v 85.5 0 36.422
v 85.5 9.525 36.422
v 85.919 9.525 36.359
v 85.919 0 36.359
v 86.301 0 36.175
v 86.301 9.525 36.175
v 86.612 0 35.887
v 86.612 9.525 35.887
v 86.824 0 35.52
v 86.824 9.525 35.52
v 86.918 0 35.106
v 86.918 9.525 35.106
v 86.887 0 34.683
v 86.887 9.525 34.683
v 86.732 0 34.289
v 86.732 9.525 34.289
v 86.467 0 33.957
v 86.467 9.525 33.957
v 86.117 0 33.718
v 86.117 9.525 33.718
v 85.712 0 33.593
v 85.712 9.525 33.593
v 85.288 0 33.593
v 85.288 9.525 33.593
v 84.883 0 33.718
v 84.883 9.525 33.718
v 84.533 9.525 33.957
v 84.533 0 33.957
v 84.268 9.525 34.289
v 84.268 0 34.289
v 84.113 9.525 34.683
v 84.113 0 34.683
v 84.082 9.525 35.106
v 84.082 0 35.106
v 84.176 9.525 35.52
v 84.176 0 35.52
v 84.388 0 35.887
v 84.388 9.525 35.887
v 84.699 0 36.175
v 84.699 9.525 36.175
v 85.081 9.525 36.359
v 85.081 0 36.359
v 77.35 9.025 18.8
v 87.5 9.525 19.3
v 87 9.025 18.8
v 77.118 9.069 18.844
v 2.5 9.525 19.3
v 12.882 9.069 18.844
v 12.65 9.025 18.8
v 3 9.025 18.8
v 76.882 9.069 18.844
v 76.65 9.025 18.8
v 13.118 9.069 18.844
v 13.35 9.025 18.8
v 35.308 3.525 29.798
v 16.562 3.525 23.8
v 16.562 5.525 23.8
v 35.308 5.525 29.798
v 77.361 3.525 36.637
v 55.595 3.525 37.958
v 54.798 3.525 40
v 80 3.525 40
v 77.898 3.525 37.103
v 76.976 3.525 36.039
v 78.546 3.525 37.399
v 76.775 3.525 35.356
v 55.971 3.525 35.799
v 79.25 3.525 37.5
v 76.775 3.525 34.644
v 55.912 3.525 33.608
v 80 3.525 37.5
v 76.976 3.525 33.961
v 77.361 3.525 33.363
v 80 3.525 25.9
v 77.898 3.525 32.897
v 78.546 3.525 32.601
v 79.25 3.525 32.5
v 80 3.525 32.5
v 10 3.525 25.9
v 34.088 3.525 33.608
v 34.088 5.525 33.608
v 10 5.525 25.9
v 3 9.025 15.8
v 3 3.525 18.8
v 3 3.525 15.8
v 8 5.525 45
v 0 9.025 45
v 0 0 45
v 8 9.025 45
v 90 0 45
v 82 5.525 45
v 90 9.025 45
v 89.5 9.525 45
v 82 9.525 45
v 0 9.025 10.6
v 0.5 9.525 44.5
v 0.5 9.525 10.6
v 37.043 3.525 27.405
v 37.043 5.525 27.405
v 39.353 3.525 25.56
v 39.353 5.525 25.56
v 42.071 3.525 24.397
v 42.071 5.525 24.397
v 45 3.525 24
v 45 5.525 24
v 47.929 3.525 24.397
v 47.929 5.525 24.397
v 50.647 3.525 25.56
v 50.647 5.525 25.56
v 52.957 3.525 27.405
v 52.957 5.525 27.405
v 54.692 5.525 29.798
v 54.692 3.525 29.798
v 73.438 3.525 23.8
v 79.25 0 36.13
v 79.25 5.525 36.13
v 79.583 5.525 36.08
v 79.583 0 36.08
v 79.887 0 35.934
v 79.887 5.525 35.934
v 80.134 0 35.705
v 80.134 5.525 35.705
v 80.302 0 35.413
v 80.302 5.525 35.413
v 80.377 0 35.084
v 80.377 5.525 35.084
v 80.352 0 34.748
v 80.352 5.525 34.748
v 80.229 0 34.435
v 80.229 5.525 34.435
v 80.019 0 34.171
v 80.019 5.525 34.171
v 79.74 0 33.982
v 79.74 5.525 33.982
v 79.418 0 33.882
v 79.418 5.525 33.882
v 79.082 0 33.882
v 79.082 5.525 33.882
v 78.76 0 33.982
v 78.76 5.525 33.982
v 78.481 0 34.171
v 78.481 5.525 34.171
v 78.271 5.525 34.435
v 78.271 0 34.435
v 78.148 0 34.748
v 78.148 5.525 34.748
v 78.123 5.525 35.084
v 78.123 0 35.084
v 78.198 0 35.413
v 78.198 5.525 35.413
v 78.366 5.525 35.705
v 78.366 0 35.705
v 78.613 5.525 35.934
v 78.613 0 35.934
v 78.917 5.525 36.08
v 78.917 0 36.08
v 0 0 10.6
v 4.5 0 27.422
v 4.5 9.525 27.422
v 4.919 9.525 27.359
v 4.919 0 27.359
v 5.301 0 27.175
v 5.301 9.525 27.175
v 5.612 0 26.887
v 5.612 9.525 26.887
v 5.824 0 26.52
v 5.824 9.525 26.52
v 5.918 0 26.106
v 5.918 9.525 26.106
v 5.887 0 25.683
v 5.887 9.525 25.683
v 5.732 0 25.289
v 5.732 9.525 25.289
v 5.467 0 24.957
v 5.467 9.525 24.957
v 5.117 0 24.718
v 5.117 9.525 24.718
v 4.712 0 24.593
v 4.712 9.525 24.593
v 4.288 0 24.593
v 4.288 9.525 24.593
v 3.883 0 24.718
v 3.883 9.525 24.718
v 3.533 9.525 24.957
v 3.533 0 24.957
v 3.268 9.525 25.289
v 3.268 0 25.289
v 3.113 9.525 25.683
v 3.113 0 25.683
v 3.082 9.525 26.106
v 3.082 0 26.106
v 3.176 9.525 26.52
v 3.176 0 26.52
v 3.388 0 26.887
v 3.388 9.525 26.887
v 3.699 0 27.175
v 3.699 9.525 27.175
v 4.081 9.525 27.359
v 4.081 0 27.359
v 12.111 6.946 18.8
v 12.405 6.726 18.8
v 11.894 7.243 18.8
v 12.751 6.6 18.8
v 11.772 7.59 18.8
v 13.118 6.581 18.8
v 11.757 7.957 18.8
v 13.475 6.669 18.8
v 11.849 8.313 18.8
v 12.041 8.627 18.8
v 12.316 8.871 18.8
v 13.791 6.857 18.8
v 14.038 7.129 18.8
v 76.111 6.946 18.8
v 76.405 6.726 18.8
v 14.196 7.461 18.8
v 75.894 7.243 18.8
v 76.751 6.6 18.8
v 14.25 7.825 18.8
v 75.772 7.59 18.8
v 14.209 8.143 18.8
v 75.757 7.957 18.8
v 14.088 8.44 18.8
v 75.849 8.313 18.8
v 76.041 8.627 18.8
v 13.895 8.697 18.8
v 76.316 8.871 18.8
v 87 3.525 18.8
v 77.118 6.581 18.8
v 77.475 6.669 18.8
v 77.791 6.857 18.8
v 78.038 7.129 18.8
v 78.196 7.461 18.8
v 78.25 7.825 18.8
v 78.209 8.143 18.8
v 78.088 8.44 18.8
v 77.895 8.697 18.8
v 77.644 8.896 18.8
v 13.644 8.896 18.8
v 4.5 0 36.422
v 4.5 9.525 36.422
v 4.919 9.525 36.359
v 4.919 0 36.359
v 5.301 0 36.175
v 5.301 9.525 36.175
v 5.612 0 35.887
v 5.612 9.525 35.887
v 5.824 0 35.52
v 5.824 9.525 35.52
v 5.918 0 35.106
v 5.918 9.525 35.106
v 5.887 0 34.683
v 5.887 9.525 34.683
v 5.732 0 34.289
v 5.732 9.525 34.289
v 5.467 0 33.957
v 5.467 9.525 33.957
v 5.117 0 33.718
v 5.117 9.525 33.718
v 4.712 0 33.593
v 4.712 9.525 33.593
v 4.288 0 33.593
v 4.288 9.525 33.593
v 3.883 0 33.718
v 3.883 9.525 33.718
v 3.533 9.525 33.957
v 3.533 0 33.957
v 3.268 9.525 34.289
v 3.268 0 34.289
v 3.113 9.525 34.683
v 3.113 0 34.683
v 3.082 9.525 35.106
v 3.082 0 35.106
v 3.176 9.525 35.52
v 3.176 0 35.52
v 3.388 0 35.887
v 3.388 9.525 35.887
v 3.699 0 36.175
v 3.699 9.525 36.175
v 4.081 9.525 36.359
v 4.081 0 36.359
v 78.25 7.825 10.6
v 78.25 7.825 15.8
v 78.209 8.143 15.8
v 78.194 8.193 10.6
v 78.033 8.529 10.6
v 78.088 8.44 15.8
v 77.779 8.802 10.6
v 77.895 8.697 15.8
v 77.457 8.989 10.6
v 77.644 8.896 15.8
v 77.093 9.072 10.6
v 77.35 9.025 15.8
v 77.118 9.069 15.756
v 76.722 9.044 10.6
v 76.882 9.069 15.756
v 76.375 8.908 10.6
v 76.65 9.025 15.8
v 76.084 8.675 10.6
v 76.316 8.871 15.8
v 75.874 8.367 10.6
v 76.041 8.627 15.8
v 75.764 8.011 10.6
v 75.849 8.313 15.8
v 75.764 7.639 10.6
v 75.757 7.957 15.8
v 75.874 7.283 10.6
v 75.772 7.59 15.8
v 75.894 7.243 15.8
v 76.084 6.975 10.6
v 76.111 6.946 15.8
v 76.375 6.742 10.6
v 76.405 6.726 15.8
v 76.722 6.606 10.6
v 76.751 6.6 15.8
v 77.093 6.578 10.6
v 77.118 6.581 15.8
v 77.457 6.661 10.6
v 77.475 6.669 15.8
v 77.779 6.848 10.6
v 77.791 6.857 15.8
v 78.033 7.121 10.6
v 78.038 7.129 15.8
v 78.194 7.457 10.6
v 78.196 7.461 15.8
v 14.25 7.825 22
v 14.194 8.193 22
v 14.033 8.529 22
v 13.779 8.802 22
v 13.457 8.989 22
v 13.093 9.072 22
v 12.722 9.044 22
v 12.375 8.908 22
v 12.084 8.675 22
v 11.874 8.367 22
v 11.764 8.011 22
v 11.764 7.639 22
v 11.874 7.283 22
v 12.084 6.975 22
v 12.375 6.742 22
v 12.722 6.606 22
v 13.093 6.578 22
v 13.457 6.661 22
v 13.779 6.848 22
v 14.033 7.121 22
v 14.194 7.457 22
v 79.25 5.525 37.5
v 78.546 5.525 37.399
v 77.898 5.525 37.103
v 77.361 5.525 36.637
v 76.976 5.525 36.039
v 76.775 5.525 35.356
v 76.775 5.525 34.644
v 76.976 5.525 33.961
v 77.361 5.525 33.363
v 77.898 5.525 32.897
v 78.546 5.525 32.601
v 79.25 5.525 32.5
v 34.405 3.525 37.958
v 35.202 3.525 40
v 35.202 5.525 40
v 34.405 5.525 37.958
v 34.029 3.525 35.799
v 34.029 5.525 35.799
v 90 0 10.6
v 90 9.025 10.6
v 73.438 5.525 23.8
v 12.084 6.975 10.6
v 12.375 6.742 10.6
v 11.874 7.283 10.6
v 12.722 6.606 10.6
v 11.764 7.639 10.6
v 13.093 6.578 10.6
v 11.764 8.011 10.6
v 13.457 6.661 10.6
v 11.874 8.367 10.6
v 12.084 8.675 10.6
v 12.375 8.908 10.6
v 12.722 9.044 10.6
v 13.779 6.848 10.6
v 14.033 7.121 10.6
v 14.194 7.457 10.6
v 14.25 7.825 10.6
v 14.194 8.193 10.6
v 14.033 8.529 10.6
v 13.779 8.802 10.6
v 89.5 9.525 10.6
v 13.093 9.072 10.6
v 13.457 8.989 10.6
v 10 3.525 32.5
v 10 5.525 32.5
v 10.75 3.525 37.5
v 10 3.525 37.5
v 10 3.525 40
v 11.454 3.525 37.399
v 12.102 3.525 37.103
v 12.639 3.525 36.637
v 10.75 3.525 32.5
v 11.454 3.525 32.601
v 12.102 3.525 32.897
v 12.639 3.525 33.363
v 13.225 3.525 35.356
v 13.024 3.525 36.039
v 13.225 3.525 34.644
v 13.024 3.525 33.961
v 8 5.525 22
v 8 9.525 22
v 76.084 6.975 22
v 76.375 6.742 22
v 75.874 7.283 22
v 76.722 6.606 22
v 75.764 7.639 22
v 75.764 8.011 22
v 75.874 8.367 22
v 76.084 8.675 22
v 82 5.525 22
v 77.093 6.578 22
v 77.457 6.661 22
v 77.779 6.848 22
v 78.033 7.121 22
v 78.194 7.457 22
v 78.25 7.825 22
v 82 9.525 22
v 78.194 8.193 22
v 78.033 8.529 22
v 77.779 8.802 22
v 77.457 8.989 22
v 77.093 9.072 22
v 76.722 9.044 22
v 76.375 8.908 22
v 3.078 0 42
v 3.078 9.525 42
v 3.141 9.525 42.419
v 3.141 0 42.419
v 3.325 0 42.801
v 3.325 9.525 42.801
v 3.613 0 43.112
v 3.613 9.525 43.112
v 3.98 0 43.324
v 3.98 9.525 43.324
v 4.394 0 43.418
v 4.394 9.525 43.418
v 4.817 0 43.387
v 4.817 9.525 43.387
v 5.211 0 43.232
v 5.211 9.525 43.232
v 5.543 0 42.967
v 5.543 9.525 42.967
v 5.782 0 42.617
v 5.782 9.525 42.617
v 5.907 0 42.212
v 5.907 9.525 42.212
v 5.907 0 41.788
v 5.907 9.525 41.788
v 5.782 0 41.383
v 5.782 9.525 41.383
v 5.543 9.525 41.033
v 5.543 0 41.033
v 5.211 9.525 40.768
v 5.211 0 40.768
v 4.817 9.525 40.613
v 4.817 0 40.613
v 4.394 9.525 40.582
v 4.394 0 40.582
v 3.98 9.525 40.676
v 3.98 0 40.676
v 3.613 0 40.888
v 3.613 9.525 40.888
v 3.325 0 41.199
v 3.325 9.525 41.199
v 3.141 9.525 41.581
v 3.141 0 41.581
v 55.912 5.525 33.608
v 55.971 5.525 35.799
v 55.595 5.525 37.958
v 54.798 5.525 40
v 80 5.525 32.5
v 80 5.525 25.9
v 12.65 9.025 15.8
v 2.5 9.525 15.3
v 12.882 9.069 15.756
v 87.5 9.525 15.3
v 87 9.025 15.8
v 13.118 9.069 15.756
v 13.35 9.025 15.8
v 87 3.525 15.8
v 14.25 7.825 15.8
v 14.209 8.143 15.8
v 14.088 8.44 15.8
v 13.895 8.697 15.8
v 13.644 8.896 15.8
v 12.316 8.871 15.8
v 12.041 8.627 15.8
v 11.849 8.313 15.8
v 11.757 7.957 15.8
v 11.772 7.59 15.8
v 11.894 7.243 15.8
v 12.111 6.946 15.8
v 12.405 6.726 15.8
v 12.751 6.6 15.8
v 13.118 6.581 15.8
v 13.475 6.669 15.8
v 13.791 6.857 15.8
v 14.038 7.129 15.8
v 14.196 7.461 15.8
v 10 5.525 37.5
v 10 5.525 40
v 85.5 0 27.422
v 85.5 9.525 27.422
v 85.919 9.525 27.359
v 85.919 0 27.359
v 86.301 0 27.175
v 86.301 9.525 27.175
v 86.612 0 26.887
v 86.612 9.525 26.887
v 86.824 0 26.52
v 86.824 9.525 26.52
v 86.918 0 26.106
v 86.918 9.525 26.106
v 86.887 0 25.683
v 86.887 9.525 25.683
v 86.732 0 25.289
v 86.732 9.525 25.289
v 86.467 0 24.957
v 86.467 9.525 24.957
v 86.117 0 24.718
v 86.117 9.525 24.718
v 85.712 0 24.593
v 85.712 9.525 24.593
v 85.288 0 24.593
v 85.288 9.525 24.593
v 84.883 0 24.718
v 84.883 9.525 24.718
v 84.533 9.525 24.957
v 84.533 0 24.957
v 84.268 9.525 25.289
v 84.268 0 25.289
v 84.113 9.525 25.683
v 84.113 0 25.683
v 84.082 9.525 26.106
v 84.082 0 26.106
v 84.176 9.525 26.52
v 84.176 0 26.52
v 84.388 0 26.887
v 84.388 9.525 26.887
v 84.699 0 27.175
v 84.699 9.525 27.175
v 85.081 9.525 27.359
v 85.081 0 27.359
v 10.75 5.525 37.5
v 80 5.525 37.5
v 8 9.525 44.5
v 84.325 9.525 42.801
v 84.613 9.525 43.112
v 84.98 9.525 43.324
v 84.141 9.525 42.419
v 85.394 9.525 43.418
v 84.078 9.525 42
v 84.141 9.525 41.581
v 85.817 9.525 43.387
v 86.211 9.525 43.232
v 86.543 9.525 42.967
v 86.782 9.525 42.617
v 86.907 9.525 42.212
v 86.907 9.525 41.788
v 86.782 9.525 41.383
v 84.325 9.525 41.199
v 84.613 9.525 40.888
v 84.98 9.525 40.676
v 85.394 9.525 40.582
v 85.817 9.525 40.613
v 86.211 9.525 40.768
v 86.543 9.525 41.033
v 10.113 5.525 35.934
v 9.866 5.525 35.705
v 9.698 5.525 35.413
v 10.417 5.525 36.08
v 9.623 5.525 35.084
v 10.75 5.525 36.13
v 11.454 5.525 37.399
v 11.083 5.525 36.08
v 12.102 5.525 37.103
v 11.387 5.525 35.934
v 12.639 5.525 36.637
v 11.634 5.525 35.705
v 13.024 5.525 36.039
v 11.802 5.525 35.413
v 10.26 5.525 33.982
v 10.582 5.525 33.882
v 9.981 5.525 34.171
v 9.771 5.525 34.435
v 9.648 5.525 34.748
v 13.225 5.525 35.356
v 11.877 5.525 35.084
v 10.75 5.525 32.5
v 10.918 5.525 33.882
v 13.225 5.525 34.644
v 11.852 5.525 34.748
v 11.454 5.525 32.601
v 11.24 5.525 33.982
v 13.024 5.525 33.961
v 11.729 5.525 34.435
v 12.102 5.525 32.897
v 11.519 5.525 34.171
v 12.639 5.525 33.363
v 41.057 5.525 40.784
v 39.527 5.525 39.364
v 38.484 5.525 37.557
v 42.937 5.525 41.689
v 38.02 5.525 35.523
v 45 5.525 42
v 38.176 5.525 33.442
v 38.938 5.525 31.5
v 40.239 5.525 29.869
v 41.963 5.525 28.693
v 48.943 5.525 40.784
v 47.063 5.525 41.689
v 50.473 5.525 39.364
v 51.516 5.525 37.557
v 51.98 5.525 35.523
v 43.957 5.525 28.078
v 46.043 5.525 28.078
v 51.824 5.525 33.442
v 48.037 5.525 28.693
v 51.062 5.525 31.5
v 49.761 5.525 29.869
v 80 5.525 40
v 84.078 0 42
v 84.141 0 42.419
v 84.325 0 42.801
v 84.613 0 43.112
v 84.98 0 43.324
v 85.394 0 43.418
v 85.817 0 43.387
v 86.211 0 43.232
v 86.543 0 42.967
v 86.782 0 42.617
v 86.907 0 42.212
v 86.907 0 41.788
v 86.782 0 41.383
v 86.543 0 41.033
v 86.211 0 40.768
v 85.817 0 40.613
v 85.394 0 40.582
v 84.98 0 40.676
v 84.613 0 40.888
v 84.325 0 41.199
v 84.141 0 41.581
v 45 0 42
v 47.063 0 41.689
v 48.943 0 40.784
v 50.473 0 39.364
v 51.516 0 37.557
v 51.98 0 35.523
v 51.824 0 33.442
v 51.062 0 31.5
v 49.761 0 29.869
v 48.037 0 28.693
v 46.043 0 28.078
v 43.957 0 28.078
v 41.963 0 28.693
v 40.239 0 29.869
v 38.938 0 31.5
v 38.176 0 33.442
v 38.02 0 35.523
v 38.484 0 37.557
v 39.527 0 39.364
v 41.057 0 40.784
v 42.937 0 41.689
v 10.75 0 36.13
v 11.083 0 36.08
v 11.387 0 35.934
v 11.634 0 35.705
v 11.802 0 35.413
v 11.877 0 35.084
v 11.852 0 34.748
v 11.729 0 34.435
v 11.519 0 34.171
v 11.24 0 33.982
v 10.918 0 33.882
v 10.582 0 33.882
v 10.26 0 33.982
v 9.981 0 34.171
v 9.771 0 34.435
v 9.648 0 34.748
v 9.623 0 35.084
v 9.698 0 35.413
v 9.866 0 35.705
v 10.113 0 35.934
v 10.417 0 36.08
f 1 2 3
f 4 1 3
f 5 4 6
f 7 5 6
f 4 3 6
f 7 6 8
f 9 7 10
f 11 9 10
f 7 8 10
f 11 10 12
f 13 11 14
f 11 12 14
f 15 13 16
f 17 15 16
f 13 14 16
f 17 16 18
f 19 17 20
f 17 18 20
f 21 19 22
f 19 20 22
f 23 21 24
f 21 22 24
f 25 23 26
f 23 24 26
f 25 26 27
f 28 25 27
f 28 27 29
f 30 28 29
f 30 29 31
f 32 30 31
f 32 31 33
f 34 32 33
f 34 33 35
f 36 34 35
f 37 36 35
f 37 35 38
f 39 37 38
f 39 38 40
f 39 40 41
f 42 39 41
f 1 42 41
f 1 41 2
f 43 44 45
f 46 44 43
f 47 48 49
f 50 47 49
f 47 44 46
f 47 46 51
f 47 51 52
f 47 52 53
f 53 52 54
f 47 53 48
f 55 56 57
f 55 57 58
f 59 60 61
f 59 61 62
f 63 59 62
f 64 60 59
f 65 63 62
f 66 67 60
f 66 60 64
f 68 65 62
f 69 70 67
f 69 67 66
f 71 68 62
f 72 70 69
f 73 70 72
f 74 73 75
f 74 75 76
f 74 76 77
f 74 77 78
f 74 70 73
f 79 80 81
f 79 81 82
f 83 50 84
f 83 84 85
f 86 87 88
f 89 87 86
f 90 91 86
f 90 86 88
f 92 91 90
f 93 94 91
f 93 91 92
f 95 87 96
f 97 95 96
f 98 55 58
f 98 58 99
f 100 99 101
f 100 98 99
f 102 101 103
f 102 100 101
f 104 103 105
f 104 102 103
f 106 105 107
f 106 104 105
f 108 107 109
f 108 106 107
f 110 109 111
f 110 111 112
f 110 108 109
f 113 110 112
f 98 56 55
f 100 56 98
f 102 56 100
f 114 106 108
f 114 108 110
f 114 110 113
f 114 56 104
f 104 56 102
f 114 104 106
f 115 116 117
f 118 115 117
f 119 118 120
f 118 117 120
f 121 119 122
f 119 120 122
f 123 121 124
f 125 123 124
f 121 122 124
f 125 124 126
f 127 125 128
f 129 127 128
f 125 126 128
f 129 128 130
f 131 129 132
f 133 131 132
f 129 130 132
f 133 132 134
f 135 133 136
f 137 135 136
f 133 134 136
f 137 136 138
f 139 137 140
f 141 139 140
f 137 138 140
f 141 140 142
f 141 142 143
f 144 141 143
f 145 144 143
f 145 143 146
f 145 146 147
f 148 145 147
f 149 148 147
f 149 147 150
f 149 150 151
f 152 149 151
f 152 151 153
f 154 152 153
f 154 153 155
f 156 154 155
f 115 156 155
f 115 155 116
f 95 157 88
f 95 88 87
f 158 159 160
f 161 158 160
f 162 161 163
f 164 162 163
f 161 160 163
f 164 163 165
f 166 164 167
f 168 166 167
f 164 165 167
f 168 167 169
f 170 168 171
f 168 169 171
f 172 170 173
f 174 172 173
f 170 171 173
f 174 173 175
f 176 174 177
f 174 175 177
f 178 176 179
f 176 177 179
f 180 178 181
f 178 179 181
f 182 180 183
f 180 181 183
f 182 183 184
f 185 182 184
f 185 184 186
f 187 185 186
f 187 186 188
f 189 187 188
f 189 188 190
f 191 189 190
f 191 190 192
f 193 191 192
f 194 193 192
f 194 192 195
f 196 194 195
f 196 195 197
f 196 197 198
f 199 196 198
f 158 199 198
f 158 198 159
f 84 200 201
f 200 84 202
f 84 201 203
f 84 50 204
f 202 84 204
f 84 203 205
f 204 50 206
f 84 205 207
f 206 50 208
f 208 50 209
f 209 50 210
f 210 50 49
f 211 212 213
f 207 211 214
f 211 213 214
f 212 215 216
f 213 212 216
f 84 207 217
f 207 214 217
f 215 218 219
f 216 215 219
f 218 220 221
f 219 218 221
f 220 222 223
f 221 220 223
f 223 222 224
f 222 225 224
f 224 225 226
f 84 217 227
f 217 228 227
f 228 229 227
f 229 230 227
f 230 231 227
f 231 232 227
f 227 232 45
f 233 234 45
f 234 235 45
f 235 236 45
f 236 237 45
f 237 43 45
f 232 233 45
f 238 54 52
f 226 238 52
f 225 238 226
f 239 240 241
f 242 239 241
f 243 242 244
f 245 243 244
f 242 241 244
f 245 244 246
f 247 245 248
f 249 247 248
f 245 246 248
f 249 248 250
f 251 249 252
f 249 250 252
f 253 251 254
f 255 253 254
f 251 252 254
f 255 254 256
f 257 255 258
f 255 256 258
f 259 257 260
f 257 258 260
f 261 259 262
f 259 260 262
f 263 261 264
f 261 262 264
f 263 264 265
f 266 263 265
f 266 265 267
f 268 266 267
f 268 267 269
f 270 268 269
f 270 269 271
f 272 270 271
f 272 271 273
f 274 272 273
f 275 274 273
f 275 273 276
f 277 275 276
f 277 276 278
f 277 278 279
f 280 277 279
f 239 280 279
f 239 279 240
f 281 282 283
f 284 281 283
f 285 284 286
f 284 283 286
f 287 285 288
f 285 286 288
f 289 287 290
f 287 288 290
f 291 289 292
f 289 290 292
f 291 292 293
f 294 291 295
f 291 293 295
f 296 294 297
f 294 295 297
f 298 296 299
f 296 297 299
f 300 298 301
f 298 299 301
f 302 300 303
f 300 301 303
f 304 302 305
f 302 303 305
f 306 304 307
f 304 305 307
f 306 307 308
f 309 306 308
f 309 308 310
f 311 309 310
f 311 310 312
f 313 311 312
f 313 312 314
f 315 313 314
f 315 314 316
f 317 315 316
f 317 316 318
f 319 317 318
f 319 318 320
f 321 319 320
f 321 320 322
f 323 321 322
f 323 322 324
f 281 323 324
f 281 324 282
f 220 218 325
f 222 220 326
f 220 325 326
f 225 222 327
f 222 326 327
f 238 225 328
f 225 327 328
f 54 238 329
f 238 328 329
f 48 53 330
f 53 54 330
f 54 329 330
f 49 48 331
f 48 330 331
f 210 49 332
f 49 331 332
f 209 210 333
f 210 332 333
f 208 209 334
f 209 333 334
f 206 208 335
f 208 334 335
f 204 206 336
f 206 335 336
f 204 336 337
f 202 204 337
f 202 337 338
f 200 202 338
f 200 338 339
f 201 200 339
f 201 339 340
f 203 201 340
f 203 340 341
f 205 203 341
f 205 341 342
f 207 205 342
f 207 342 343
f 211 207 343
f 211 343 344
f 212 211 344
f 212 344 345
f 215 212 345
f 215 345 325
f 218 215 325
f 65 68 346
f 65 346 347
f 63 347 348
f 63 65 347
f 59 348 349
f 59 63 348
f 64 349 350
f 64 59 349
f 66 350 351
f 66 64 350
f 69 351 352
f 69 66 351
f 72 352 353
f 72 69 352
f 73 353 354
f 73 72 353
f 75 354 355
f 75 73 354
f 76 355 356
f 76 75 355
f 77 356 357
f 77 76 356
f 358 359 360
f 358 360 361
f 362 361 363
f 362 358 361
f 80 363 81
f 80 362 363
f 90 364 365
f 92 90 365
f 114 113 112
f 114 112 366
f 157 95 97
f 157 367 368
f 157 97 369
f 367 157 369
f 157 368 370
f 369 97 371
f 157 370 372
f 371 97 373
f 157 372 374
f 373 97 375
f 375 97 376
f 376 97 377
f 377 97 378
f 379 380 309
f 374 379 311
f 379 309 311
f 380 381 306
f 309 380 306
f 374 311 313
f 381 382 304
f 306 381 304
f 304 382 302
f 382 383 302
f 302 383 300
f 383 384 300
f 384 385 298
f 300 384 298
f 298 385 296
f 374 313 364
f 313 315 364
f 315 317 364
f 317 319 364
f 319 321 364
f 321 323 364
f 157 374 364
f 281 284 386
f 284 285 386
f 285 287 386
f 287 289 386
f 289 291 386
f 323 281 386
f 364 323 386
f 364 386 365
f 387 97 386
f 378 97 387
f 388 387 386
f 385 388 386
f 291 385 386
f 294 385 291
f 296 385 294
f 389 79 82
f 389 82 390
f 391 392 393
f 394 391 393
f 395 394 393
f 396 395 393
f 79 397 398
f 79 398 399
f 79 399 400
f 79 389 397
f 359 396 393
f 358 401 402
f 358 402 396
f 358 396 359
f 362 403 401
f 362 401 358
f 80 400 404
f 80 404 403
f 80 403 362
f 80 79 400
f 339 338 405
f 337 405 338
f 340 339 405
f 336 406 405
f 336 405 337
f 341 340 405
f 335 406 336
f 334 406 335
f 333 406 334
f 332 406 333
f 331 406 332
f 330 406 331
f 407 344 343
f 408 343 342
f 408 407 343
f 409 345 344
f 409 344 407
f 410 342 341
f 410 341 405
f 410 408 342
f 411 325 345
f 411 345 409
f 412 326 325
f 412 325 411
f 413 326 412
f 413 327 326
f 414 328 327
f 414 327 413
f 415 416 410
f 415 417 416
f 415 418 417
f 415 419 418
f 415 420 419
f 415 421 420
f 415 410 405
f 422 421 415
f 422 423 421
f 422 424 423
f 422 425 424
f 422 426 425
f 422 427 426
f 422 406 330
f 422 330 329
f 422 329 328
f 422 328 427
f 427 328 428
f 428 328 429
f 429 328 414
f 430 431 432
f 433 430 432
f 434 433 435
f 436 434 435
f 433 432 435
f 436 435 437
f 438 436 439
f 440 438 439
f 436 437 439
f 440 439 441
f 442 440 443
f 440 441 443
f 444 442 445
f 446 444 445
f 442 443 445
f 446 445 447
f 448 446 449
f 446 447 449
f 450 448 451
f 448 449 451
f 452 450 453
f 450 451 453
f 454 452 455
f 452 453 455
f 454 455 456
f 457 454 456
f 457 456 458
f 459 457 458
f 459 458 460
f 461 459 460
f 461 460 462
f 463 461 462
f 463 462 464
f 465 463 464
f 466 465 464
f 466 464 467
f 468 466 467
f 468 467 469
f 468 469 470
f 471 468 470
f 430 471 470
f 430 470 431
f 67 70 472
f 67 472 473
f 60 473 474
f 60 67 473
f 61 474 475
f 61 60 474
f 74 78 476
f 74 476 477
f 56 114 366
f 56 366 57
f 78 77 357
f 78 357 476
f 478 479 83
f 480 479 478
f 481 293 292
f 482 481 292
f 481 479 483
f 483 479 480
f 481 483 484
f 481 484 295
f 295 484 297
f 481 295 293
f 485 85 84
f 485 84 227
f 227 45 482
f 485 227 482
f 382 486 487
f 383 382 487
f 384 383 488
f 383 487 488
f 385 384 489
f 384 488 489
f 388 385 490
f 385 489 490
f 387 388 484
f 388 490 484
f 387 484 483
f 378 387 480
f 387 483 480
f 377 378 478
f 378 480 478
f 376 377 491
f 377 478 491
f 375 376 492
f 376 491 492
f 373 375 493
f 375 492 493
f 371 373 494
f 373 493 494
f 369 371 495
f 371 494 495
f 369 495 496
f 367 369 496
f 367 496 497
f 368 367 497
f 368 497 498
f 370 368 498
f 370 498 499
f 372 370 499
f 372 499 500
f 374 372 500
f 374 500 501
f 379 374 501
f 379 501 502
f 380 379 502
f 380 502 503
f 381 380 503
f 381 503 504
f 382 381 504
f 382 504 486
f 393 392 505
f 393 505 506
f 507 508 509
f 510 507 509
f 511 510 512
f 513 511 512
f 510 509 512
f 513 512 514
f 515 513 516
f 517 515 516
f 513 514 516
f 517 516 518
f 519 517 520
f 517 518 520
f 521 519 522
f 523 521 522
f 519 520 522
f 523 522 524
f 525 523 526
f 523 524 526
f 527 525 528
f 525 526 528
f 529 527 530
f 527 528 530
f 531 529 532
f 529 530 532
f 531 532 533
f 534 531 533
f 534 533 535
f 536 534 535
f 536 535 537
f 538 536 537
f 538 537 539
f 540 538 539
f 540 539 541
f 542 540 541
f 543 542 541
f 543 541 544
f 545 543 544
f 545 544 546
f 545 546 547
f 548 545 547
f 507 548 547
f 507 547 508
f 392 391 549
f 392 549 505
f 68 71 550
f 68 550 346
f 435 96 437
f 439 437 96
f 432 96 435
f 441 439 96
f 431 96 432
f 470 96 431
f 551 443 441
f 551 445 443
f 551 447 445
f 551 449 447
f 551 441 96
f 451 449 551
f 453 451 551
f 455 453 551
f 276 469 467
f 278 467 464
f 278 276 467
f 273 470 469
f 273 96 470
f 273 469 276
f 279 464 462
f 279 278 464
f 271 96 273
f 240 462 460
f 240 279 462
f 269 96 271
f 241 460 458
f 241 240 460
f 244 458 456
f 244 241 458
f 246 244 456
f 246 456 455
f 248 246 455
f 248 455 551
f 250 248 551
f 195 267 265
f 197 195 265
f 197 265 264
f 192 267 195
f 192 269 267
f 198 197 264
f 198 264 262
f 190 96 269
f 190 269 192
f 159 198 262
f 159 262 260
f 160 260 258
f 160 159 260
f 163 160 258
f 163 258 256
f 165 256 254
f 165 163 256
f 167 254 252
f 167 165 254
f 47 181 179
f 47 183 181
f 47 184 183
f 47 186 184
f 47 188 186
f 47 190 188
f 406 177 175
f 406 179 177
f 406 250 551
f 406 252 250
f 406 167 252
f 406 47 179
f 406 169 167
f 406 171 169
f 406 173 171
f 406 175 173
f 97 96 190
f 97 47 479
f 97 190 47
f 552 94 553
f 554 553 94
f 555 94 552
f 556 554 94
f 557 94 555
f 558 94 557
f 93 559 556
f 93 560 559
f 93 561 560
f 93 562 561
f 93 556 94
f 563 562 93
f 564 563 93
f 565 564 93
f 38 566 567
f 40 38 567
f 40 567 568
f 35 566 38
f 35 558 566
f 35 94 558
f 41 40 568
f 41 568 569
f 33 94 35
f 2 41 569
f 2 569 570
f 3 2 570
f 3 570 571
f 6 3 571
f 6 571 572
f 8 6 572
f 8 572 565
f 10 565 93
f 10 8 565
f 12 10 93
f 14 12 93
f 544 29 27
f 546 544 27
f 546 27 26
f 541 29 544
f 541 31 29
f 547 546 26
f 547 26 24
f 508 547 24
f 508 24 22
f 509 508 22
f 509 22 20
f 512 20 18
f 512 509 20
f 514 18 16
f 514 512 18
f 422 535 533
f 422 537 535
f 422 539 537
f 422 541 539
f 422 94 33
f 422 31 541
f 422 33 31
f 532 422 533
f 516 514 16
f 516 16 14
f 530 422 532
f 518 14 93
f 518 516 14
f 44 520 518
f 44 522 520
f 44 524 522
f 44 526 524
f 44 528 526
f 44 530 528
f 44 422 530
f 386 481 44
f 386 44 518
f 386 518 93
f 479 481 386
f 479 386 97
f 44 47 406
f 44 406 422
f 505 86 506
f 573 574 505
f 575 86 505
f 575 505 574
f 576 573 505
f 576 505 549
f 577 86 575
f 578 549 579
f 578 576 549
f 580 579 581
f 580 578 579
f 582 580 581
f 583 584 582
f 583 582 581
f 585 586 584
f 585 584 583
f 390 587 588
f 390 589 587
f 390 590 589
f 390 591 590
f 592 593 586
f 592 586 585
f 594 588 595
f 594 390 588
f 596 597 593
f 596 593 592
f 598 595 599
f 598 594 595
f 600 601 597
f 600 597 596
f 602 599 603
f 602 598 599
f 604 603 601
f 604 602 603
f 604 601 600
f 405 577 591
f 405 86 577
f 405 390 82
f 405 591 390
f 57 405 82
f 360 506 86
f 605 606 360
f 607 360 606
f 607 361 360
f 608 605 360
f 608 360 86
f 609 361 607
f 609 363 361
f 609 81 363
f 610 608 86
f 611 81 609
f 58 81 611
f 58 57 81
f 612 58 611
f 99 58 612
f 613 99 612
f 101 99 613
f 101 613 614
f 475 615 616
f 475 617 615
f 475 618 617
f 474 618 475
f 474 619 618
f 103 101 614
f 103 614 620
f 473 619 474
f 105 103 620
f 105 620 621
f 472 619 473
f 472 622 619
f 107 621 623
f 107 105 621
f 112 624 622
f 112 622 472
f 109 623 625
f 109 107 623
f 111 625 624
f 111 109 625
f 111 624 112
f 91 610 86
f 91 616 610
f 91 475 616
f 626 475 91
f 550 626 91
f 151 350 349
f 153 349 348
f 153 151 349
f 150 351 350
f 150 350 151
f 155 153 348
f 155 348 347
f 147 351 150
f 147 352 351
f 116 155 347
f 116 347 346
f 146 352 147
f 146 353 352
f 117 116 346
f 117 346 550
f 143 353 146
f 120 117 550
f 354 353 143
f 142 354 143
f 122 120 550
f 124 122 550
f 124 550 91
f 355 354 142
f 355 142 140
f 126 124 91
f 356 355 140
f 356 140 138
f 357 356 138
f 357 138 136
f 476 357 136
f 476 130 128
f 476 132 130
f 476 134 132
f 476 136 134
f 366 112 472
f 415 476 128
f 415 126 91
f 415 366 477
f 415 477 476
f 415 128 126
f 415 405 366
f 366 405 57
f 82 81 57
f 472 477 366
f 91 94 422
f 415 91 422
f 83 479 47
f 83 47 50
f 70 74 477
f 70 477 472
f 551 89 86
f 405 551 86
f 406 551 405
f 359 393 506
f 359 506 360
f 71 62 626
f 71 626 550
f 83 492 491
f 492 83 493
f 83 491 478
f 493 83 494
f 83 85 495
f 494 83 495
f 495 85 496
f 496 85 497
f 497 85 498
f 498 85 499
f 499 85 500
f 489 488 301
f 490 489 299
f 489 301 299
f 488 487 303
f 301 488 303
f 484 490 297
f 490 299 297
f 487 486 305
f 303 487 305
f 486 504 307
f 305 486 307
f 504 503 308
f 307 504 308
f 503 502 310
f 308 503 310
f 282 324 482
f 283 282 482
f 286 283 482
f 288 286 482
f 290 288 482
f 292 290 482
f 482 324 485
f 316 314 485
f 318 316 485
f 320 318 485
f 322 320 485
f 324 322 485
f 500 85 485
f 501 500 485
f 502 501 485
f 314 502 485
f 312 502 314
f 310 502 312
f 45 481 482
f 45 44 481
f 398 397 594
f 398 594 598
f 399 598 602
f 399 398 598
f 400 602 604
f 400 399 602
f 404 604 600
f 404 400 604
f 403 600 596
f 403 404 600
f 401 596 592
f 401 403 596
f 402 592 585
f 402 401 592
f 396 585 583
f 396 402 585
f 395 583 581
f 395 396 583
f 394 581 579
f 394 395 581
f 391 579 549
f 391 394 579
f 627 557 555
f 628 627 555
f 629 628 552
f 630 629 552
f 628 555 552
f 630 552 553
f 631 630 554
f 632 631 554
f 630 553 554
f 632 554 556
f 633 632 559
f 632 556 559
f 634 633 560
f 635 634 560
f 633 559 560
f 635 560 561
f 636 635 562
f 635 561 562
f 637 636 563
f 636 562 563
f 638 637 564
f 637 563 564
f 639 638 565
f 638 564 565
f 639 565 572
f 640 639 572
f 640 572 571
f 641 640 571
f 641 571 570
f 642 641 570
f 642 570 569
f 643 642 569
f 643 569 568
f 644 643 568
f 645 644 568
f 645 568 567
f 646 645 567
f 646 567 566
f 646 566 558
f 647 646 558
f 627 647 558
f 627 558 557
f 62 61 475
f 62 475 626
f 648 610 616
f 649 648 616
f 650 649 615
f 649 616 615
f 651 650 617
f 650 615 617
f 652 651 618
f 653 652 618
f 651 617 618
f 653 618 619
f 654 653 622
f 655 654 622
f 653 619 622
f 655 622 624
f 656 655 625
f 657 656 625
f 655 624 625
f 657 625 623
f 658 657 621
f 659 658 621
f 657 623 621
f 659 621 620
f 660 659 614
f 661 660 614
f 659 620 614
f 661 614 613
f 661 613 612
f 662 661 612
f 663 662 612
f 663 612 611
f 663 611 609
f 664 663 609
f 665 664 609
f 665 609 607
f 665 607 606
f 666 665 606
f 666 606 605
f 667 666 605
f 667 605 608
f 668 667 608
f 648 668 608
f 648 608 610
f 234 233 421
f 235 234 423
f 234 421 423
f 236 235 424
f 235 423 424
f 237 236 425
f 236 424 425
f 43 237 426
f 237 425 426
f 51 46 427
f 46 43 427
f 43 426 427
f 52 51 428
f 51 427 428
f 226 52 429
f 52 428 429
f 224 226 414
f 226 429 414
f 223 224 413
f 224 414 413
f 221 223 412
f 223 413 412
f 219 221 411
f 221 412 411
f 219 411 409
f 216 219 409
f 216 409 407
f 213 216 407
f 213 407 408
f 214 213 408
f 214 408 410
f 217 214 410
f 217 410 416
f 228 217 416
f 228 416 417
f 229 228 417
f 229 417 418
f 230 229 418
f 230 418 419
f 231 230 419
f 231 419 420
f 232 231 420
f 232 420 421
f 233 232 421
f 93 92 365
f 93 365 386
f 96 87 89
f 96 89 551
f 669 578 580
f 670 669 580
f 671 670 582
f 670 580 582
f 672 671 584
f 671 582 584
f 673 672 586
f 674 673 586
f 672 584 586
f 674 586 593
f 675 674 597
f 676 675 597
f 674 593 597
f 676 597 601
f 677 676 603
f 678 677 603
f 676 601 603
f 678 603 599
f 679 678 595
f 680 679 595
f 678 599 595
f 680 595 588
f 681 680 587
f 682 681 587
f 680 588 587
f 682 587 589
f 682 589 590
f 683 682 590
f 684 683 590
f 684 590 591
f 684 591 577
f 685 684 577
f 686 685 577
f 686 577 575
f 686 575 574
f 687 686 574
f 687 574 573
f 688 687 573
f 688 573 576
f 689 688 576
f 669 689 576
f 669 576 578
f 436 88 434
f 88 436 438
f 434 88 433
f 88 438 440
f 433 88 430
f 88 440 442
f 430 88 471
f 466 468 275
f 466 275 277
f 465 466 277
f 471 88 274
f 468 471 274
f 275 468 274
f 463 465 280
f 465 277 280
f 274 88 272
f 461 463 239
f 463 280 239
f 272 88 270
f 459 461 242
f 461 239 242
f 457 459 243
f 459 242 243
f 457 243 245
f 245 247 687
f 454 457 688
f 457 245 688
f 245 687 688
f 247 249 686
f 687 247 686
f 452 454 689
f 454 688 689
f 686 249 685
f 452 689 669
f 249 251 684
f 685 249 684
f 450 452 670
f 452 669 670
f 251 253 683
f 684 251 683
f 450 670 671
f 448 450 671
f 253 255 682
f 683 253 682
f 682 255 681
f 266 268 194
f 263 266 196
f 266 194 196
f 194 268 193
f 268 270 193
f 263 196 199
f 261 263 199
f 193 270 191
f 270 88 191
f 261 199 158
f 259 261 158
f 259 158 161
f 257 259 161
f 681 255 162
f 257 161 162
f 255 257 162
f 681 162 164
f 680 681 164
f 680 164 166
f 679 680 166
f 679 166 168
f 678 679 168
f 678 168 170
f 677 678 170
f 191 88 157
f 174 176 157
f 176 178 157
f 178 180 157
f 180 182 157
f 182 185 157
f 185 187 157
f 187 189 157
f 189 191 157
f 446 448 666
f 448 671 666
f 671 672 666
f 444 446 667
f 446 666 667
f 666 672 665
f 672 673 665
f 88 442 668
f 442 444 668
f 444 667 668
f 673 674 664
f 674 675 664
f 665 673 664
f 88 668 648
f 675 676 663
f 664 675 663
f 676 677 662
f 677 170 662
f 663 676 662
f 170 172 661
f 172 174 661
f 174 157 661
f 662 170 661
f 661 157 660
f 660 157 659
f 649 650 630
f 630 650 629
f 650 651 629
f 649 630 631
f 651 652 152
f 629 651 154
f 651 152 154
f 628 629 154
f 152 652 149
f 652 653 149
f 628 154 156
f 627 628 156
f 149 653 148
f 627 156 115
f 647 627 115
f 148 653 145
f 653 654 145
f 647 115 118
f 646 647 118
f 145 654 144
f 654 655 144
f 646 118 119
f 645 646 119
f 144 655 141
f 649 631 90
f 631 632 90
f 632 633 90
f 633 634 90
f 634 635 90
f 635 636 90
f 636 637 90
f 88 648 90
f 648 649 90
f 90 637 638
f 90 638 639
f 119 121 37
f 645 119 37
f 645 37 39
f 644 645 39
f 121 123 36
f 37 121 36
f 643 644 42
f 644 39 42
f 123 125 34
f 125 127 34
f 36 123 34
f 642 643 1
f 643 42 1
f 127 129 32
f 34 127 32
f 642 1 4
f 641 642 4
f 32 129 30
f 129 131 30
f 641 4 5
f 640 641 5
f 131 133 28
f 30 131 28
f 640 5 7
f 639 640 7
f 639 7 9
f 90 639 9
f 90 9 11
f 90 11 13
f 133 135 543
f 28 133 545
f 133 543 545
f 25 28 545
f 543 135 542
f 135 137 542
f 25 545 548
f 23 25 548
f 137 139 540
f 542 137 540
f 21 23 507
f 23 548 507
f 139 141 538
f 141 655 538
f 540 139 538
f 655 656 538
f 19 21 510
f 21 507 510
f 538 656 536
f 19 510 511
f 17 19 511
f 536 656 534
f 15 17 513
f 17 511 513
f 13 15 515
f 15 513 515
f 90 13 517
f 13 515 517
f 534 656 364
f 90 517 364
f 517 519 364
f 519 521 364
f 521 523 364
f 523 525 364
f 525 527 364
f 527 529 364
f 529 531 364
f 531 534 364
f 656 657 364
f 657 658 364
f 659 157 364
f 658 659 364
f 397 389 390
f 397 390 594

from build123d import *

# Parameters (mm, degrees)
SKETCH1_W               = 90
SKETCH1_H               = 9.525
SKETCH1_R               = 2
BOSS_EXTRUDE1_DEPTH     = 45
SKETCH2_R               = 7
CUT_EXTRUDE2_DEPTH      = 10
SKETCH3_R               = 1.4224
SKETCH3_R_2             = 7
SKETCH3_R_3             = 1.1303
CUT_EXTRUDE3_DEPTH      = 10
SKETCH4_W               = 84
SKETCH4_H               = 3
CUT_EXTRUDE4_DEPTH      = 6
CUT_EXTRUDE6_DEPTH      = 102.072872844
CUT_EXTRUDE6_DEPTH_BACK = 6
SKETCH7_W               = 90
SKETCH7_H               = 3
CUT_EXTRUDE7_DEPTH      = 10
SKETCH9_W               = 74
SKETCH9_H               = 23
CUT_EXTRUDE8_DEPTH      = 4
CUT_EXTRUDE9_REACH      = 95.379
SKETCH10_R              = 1.25
CHAMFER2_SIZE           = 0.5
SKETCH11_R              = 1.4224
CUT_EXTRUDE10_DEPTH     = 10
SKETCH12_W              = 100.09511362
SKETCH12_H              = 20.870657589
CUT_EXTRUDE11_DEPTH     = 10


with BuildPart() as part:
    # Sketch1 → Boss-Extrude1 (new body)
    # profile 1 of 3: a face of its own
    with BuildSketch(Plane.XY):
        with Locations((45, 4.7625)):
            Rectangle(SKETCH1_W, SKETCH1_H)
        with Locations((60, 4.7625)):
            Circle(SKETCH1_R, mode=Mode.SUBTRACT)
        with Locations((30, 4.7625)):
            Circle(SKETCH1_R, mode=Mode.SUBTRACT)
    # profile 2 of 3: a face of its own
    with BuildSketch(Plane.XY):
        with Locations((30, 4.7625)):
            Circle(SKETCH1_R)
    # profile 3 of 3: a face of its own
    with BuildSketch(Plane.XY):
        with Locations((60, 4.7625)):
            Circle(SKETCH1_R)
    extrude(amount=BOSS_EXTRUDE1_DEPTH)

    # Sketch2 → Cut-Extrude2 (cut)
    with BuildSketch(Plane(origin=(0, 9.525, 0), x_dir=(1, 0, 0), z_dir=(0, 1, 0))):
        with Locations(Location((45, -35, 0), (0, 0, 270))):
            Circle(SKETCH2_R)
    extrude(amount=-CUT_EXTRUDE2_DEPTH, mode=Mode.SUBTRACT)

    # Sketch3 → Cut-Extrude3 (cut)
    with BuildSketch(Plane(origin=(0, 9.525, 0), x_dir=(1, 0, 0), z_dir=(0, 1, 0))):
        with Locations(Location((85.5, -35, 0), (0, 0, 270))):
            Circle(SKETCH3_R)
        with Locations(Location((4.5, -35, 0), (0, 0, 270))):
            Circle(SKETCH3_R)
        with Locations(Location((45, -35, 0), (0, 0, 270))):
            Circle(SKETCH3_R_2)
        with Locations(Location((85.5, -26, 0), (0, 0, 270))):
            Circle(SKETCH3_R)
        with Locations(Location((4.5, -26, 0), (0, 0, 270))):
            Circle(SKETCH3_R)
        with Locations(Location((79.25, -35, 0), (0, 0, 270))):
            Circle(SKETCH3_R_3)
        with Locations(Location((10.75, -35, 0), (0, 0, 270))):
            Circle(SKETCH3_R_3)
    extrude(amount=-CUT_EXTRUDE3_DEPTH, mode=Mode.SUBTRACT)

    # Sketch4 → Cut-Extrude4 (cut)
    with BuildSketch(Plane(origin=(0, 9.525, 0), x_dir=(1, 0, 0), z_dir=(0, 1, 0))):
        with Locations((45, -17.3)):
            Rectangle(SKETCH4_W, SKETCH4_H)
    extrude(amount=-CUT_EXTRUDE4_DEPTH, mode=Mode.SUBTRACT)

    # Sketch6 → Cut-Extrude6 (cut, two sides: drawn at the far end of the back side and taken through both)
    with BuildSketch(Plane(origin=(0, 9.525, 0), x_dir=(1, 0, 0), z_dir=(0, 1, 0)).offset(-CUT_EXTRUDE6_DEPTH_BACK)):
        with BuildLine():
            ThreePointArc((10.75, -32.5), (13.25, -35), (10.75, -37.5))
            Line((10.75, -37.5), (10, -37.5))
            Line((10, -37.5), (10, -40))
            Line((10, -40), (35.202041029, -40))
            ThreePointArc((35.202041029, -40), (34.163248317, -36.888071228), (34.08840625, -33.60819476))
            Line((34.08840625, -33.60819476), (10, -25.89990476))
            Line((10, -25.89990476), (10, -32.5))
            Line((10, -32.5), (10.75, -32.5))
        make_face()
        with BuildLine():
            Line((16.562202374, -23.8), (35.307509158, -29.798498171))
            ThreePointArc((35.307509158, -29.798498171), (45, -24), (54.692490842, -29.798498171))
            Line((54.692490842, -29.798498171), (73.437797626, -23.8))
            Line((73.437797626, -23.8), (16.562202374, -23.8))
        make_face()
        with BuildLine():
            ThreePointArc((55.91159375, -33.60819476), (55.836751683, -36.888071228), (54.797958971, -40))
            Line((54.797958971, -40), (80, -40))
            Line((80, -40), (80, -37.5))
            Line((80, -37.5), (79.25, -37.5))
            ThreePointArc((79.25, -37.5), (76.75, -35), (79.25, -32.5))
            Line((79.25, -32.5), (80, -32.5))
            Line((80, -32.5), (80, -25.89990476))
            Line((80, -25.89990476), (55.91159375, -33.60819476))
        make_face()
    extrude(amount=CUT_EXTRUDE6_DEPTH + CUT_EXTRUDE6_DEPTH_BACK, mode=Mode.SUBTRACT)

    # Sketch7 → Cut-Extrude7 (cut)
    with BuildSketch(Plane(origin=(0, 9.525, 0), x_dir=(1, 0, 0), z_dir=(0, 1, 0))):
        with Locations((45, -1.5)):
            Rectangle(SKETCH7_W, SKETCH7_H)
    extrude(amount=-CUT_EXTRUDE7_DEPTH, mode=Mode.SUBTRACT)

    # Sketch9 → Cut-Extrude8 (cut)
    with BuildSketch(Plane(origin=(0, 9.525, 0), x_dir=(1, 0, 0), z_dir=(0, 1, 0))):
        with Locations((45, -33.5)):
            Rectangle(SKETCH9_W, SKETCH9_H)
    extrude(amount=-CUT_EXTRUDE8_DEPTH, mode=Mode.SUBTRACT)

    # Cut-Extrude9: up to this face of the body (flat: up to its plane)
    cut_extrude9_end = Plane(part.part.faces().sort_by_distance((45, 4.7625, 3))[0])
    # Sketch10 → Cut-Extrude9 (cut, up to the picked face)
    with BuildSketch(Plane.XY.offset(22), mode=Mode.PRIVATE) as cut_extrude9_sk1:
        with Locations((77, 7.825)):
            Circle(SKETCH10_R)
    cut_extrude9_tool1 = split(extrude(cut_extrude9_sk1.sketch, amount=-CUT_EXTRUDE9_REACH, mode=Mode.PRIVATE), bisect_by=cut_extrude9_end, keep=Keep.BOTH, mode=Mode.PRIVATE)
    # Sketch10 → Cut-Extrude9 (cut, up to the picked face)
    with BuildSketch(Plane.XY.offset(22), mode=Mode.PRIVATE) as cut_extrude9_sk2:
        with Locations((13, 7.825)):
            Circle(SKETCH10_R)
    cut_extrude9_tool2 = split(extrude(cut_extrude9_sk2.sketch, amount=-CUT_EXTRUDE9_REACH, mode=Mode.PRIVATE), bisect_by=cut_extrude9_end, keep=Keep.BOTH, mode=Mode.PRIVATE)
    add(cut_extrude9_tool1.solids().sort_by(Axis((77, 7.825, 22), (0, 0, -1)))[0], mode=Mode.SUBTRACT)
    add(cut_extrude9_tool2.solids().sort_by(Axis((13, 7.825, 22), (0, 0, -1)))[0], mode=Mode.SUBTRACT)

    # Chamfer2
    # the kernel refuses this chamfer: 0.5 mm, written as the material it takes off along each edge
    with BuildSketch(Plane(origin=(9.285841494, 9.525, 45), x_dir=(0, -0.999621916911297, 0.0274958766105822), z_dir=(-1, 0, 0))) as chamfer2_piece_1:
        Polygon((CHAMFER2_SIZE * 0.999621916911, -CHAMFER2_SIZE * 0.0274958766106), (-CHAMFER2_SIZE * 0.0274958766106, -CHAMFER2_SIZE * 0.999621916911), (0, 0), align=None)
    extrude(amount=10.571682988, mode=Mode.SUBTRACT)
    with BuildSketch(Plane(origin=(-1.285841494, 9.525, 3), x_dir=(0, -0.9996219169112968, -0.02749587661058651), z_dir=(1, 0, 0))) as chamfer2_piece_2:
        Polygon((CHAMFER2_SIZE * 0.999621916911, -CHAMFER2_SIZE * 0.0274958766106), (-CHAMFER2_SIZE * 0.0274958766106, -CHAMFER2_SIZE * 0.999621916911), (0, 0), align=None)
    extrude(amount=92.571682988, mode=Mode.SUBTRACT)
    with BuildSketch(Plane(origin=(87, 9.525, 18.8), x_dir=(0.999621916911297, 0.027495876610582292, 0), z_dir=(0, 0, -1)), Plane(origin=(3, 9.525, 15.8), x_dir=(-0.9996219169112968, 0.027495876610585408, -1.035816383536533e-15), z_dir=(0, 0, 1))) as chamfer2_piece_3:
        Polygon((CHAMFER2_SIZE * 0.999621916911, CHAMFER2_SIZE * 0.0274958766106), (-CHAMFER2_SIZE * 0.0274958766106, CHAMFER2_SIZE * 0.999621916911), (0, 0), align=None)
    extrude(amount=3, mode=Mode.SUBTRACT)
    with BuildSketch(Plane(origin=(87, 9.525, 15.8), x_dir=(0, 0.0274958766105822, -0.999621916911297), z_dir=(-1, 0, 0)), Plane(origin=(3, 9.525, 18.8), x_dir=(0, 0.02749587661058555, 0.9996219169112968), z_dir=(1, 0, 0))) as chamfer2_piece_4:
        Polygon((CHAMFER2_SIZE * 0.999621916911, CHAMFER2_SIZE * 0.0274958766106), (-CHAMFER2_SIZE * 0.0274958766106, CHAMFER2_SIZE * 0.999621916911), (0, 0), align=None)
    extrude(amount=84, mode=Mode.SUBTRACT)
    with BuildSketch(Plane(origin=(0, 9.525, 1.714158506), x_dir=(-0.02749587661058639, -0.9996219169112968, 0), z_dir=(0, 0, 1))) as chamfer2_piece_5:
        Polygon((CHAMFER2_SIZE * 0.999621916911, CHAMFER2_SIZE * 0.0274958766106), (-CHAMFER2_SIZE * 0.0274958766106, CHAMFER2_SIZE * 0.999621916911), (0, 0), align=None)
    extrude(amount=44.571682988, mode=Mode.SUBTRACT)
    with BuildSketch(Plane(origin=(90, 9.525, 1.714158506), x_dir=(0.0274958766105822, -0.999621916911297, 0), z_dir=(0, 0, 1))) as chamfer2_piece_6:
        Polygon((CHAMFER2_SIZE * 0.999621916911, -CHAMFER2_SIZE * 0.0274958766106), (-CHAMFER2_SIZE * 0.0274958766106, -CHAMFER2_SIZE * 0.999621916911), (0, 0), align=None)
    extrude(amount=44.571682988, mode=Mode.SUBTRACT)
    with BuildSketch(Plane(origin=(87, 9.525, 20.085841494), x_dir=(0.9996219169112968, 0.02749587661058574, 0), z_dir=(0, 0, -1))) as chamfer2_piece_7a_section:
        Polygon((CHAMFER2_SIZE * 0.999621916911, CHAMFER2_SIZE * 0.0274958766106), (-CHAMFER2_SIZE * 0.0274958766106, CHAMFER2_SIZE * 0.999621916911), (0, 0), align=None)
    chamfer2_piece_7a = extrude(amount=4.285841494, mode=Mode.PRIVATE)
    chamfer2_piece_7a = split(chamfer2_piece_7a, bisect_by=Plane(origin=(87.164896813, 9.360103187, 18.8), z_dir=(0, 0, 1)), keep=Keep.TOP, mode=Mode.PRIVATE)
    with BuildSketch(Plane(origin=(3, 9.525, 18.8), x_dir=(0, 0.02749587661058555, 0.9996219169112968), z_dir=(1, 0, 0))) as chamfer2_piece_7b_section:
        Polygon((CHAMFER2_SIZE * 0.999621916911, CHAMFER2_SIZE * 0.0274958766106), (-CHAMFER2_SIZE * 0.0274958766106, CHAMFER2_SIZE * 0.999621916911), (0, 0), align=None)
    chamfer2_piece_7b = extrude(amount=85.285841494, mode=Mode.PRIVATE)
    chamfer2_piece_7b = split(chamfer2_piece_7b, bisect_by=Plane(origin=(87, 9.360103187, 18.964896813), z_dir=(1, 0, 0)), keep=Keep.TOP, mode=Mode.PRIVATE)
    chamfer2_piece_7 = chamfer2_piece_7a & chamfer2_piece_7b
    add(chamfer2_piece_7, mode=Mode.SUBTRACT)
    with BuildSketch(Plane(origin=(87, 9.525, 18.8), x_dir=(0.999621916911297, 0.027495876610582292, 0), z_dir=(0, 0, -1))) as chamfer2_piece_8a_section:
        Polygon((CHAMFER2_SIZE * 0.999621916911, CHAMFER2_SIZE * 0.0274958766106), (-CHAMFER2_SIZE * 0.0274958766106, CHAMFER2_SIZE * 0.999621916911), (0, 0), align=None)
    chamfer2_piece_8a = extrude(amount=4.285841494, mode=Mode.PRIVATE)
    chamfer2_piece_8a = split(chamfer2_piece_8a, bisect_by=Plane(origin=(87.164896813, 9.360103187, 15.8), z_dir=(0, 0, -1)), keep=Keep.TOP, mode=Mode.PRIVATE)
    with BuildSketch(Plane(origin=(88.285841494, 9.525, 15.8), x_dir=(0, 0.027495876610585647, -0.9996219169112968), z_dir=(-1, 0, 0))) as chamfer2_piece_8b_section:
        Polygon((CHAMFER2_SIZE * 0.999621916911, CHAMFER2_SIZE * 0.0274958766106), (-CHAMFER2_SIZE * 0.0274958766106, CHAMFER2_SIZE * 0.999621916911), (0, 0), align=None)
    chamfer2_piece_8b = extrude(amount=85.285841494, mode=Mode.PRIVATE)
    chamfer2_piece_8b = split(chamfer2_piece_8b, bisect_by=Plane(origin=(87, 9.360103187, 15.635103187), z_dir=(1, 0, 0)), keep=Keep.TOP, mode=Mode.PRIVATE)
    chamfer2_piece_8 = chamfer2_piece_8a & chamfer2_piece_8b
    add(chamfer2_piece_8, mode=Mode.SUBTRACT)
    with BuildSketch(Plane(origin=(87, 9.525, 15.8), x_dir=(0, 0.0274958766105822, -0.999621916911297), z_dir=(-1, 0, 0))) as chamfer2_piece_9a_section:
        Polygon((CHAMFER2_SIZE * 0.999621916911, CHAMFER2_SIZE * 0.0274958766106), (-CHAMFER2_SIZE * 0.0274958766106, CHAMFER2_SIZE * 0.999621916911), (0, 0), align=None)
    chamfer2_piece_9a = extrude(amount=85.285841494, mode=Mode.PRIVATE)
    chamfer2_piece_9a = split(chamfer2_piece_9a, bisect_by=Plane(origin=(3, 9.360103187, 15.635103187), z_dir=(-1, 0, 0)), keep=Keep.TOP, mode=Mode.PRIVATE)
    with BuildSketch(Plane(origin=(3, 9.525, 14.514158506), x_dir=(-0.9996219169112968, 0.027495876610585623, -1.035816383536533e-15), z_dir=(0, 0, 1))) as chamfer2_piece_9b_section:
        Polygon((CHAMFER2_SIZE * 0.999621916911, CHAMFER2_SIZE * 0.0274958766106), (-CHAMFER2_SIZE * 0.0274958766106, CHAMFER2_SIZE * 0.999621916911), (0, 0), align=None)
    chamfer2_piece_9b = extrude(amount=4.285841494, mode=Mode.PRIVATE)
    chamfer2_piece_9b = split(chamfer2_piece_9b, bisect_by=Plane(origin=(2.835103187, 9.360103187, 15.8), z_dir=(0, 0, -1)), keep=Keep.TOP, mode=Mode.PRIVATE)
    chamfer2_piece_9 = chamfer2_piece_9a & chamfer2_piece_9b
    add(chamfer2_piece_9, mode=Mode.SUBTRACT)
    with BuildSketch(Plane(origin=(1.714158506, 9.525, 18.8), x_dir=(0, 0.02749587661058555, 0.9996219169112968), z_dir=(1, 0, 0))) as chamfer2_piece_10a_section:
        Polygon((CHAMFER2_SIZE * 0.999621916911, CHAMFER2_SIZE * 0.0274958766106), (-CHAMFER2_SIZE * 0.0274958766106, CHAMFER2_SIZE * 0.999621916911), (0, 0), align=None)
    chamfer2_piece_10a = extrude(amount=85.285841494, mode=Mode.PRIVATE)
    chamfer2_piece_10a = split(chamfer2_piece_10a, bisect_by=Plane(origin=(3, 9.360103187, 18.964896813), z_dir=(-1, 0, 0)), keep=Keep.TOP, mode=Mode.PRIVATE)
    with BuildSketch(Plane(origin=(3, 9.525, 15.8), x_dir=(-0.9996219169112968, 0.027495876610585408, -1.035816383536533e-15), z_dir=(0, 0, 1))) as chamfer2_piece_10b_section:
        Polygon((CHAMFER2_SIZE * 0.999621916911, CHAMFER2_SIZE * 0.0274958766106), (-CHAMFER2_SIZE * 0.0274958766106, CHAMFER2_SIZE * 0.999621916911), (0, 0), align=None)
    chamfer2_piece_10b = extrude(amount=4.285841494, mode=Mode.PRIVATE)
    chamfer2_piece_10b = split(chamfer2_piece_10b, bisect_by=Plane(origin=(2.835103187, 9.360103187, 18.8), z_dir=(0, 0, 1)), keep=Keep.TOP, mode=Mode.PRIVATE)
    chamfer2_piece_10 = chamfer2_piece_10a & chamfer2_piece_10b
    add(chamfer2_piece_10, mode=Mode.SUBTRACT)

    # Sketch11 → Cut-Extrude10 (cut)
    with BuildSketch(Plane(origin=(0, 9.525, 0), x_dir=(1, 0, 0), z_dir=(0, 1, 0))):
        with Locations(Location((85.5, -42, 0), (0, 0, 180))):
            Circle(SKETCH11_R)
        with Locations(Location((4.5, -42, 0), (0, 0, 180))):
            Circle(SKETCH11_R)
    extrude(amount=-CUT_EXTRUDE10_DEPTH, mode=Mode.SUBTRACT)

    # Sketch12 → Cut-Extrude11 (cut)
    with BuildSketch(Plane(origin=(0, 9.525, 0), x_dir=(1, 0, 0), z_dir=(0, 1, 0))):
        with Locations((41.282725073, -0.164671206)):
            Rectangle(SKETCH12_W, SKETCH12_H)
    extrude(amount=-CUT_EXTRUDE11_DEPTH, mode=Mode.SUBTRACT)


solid = part.part
